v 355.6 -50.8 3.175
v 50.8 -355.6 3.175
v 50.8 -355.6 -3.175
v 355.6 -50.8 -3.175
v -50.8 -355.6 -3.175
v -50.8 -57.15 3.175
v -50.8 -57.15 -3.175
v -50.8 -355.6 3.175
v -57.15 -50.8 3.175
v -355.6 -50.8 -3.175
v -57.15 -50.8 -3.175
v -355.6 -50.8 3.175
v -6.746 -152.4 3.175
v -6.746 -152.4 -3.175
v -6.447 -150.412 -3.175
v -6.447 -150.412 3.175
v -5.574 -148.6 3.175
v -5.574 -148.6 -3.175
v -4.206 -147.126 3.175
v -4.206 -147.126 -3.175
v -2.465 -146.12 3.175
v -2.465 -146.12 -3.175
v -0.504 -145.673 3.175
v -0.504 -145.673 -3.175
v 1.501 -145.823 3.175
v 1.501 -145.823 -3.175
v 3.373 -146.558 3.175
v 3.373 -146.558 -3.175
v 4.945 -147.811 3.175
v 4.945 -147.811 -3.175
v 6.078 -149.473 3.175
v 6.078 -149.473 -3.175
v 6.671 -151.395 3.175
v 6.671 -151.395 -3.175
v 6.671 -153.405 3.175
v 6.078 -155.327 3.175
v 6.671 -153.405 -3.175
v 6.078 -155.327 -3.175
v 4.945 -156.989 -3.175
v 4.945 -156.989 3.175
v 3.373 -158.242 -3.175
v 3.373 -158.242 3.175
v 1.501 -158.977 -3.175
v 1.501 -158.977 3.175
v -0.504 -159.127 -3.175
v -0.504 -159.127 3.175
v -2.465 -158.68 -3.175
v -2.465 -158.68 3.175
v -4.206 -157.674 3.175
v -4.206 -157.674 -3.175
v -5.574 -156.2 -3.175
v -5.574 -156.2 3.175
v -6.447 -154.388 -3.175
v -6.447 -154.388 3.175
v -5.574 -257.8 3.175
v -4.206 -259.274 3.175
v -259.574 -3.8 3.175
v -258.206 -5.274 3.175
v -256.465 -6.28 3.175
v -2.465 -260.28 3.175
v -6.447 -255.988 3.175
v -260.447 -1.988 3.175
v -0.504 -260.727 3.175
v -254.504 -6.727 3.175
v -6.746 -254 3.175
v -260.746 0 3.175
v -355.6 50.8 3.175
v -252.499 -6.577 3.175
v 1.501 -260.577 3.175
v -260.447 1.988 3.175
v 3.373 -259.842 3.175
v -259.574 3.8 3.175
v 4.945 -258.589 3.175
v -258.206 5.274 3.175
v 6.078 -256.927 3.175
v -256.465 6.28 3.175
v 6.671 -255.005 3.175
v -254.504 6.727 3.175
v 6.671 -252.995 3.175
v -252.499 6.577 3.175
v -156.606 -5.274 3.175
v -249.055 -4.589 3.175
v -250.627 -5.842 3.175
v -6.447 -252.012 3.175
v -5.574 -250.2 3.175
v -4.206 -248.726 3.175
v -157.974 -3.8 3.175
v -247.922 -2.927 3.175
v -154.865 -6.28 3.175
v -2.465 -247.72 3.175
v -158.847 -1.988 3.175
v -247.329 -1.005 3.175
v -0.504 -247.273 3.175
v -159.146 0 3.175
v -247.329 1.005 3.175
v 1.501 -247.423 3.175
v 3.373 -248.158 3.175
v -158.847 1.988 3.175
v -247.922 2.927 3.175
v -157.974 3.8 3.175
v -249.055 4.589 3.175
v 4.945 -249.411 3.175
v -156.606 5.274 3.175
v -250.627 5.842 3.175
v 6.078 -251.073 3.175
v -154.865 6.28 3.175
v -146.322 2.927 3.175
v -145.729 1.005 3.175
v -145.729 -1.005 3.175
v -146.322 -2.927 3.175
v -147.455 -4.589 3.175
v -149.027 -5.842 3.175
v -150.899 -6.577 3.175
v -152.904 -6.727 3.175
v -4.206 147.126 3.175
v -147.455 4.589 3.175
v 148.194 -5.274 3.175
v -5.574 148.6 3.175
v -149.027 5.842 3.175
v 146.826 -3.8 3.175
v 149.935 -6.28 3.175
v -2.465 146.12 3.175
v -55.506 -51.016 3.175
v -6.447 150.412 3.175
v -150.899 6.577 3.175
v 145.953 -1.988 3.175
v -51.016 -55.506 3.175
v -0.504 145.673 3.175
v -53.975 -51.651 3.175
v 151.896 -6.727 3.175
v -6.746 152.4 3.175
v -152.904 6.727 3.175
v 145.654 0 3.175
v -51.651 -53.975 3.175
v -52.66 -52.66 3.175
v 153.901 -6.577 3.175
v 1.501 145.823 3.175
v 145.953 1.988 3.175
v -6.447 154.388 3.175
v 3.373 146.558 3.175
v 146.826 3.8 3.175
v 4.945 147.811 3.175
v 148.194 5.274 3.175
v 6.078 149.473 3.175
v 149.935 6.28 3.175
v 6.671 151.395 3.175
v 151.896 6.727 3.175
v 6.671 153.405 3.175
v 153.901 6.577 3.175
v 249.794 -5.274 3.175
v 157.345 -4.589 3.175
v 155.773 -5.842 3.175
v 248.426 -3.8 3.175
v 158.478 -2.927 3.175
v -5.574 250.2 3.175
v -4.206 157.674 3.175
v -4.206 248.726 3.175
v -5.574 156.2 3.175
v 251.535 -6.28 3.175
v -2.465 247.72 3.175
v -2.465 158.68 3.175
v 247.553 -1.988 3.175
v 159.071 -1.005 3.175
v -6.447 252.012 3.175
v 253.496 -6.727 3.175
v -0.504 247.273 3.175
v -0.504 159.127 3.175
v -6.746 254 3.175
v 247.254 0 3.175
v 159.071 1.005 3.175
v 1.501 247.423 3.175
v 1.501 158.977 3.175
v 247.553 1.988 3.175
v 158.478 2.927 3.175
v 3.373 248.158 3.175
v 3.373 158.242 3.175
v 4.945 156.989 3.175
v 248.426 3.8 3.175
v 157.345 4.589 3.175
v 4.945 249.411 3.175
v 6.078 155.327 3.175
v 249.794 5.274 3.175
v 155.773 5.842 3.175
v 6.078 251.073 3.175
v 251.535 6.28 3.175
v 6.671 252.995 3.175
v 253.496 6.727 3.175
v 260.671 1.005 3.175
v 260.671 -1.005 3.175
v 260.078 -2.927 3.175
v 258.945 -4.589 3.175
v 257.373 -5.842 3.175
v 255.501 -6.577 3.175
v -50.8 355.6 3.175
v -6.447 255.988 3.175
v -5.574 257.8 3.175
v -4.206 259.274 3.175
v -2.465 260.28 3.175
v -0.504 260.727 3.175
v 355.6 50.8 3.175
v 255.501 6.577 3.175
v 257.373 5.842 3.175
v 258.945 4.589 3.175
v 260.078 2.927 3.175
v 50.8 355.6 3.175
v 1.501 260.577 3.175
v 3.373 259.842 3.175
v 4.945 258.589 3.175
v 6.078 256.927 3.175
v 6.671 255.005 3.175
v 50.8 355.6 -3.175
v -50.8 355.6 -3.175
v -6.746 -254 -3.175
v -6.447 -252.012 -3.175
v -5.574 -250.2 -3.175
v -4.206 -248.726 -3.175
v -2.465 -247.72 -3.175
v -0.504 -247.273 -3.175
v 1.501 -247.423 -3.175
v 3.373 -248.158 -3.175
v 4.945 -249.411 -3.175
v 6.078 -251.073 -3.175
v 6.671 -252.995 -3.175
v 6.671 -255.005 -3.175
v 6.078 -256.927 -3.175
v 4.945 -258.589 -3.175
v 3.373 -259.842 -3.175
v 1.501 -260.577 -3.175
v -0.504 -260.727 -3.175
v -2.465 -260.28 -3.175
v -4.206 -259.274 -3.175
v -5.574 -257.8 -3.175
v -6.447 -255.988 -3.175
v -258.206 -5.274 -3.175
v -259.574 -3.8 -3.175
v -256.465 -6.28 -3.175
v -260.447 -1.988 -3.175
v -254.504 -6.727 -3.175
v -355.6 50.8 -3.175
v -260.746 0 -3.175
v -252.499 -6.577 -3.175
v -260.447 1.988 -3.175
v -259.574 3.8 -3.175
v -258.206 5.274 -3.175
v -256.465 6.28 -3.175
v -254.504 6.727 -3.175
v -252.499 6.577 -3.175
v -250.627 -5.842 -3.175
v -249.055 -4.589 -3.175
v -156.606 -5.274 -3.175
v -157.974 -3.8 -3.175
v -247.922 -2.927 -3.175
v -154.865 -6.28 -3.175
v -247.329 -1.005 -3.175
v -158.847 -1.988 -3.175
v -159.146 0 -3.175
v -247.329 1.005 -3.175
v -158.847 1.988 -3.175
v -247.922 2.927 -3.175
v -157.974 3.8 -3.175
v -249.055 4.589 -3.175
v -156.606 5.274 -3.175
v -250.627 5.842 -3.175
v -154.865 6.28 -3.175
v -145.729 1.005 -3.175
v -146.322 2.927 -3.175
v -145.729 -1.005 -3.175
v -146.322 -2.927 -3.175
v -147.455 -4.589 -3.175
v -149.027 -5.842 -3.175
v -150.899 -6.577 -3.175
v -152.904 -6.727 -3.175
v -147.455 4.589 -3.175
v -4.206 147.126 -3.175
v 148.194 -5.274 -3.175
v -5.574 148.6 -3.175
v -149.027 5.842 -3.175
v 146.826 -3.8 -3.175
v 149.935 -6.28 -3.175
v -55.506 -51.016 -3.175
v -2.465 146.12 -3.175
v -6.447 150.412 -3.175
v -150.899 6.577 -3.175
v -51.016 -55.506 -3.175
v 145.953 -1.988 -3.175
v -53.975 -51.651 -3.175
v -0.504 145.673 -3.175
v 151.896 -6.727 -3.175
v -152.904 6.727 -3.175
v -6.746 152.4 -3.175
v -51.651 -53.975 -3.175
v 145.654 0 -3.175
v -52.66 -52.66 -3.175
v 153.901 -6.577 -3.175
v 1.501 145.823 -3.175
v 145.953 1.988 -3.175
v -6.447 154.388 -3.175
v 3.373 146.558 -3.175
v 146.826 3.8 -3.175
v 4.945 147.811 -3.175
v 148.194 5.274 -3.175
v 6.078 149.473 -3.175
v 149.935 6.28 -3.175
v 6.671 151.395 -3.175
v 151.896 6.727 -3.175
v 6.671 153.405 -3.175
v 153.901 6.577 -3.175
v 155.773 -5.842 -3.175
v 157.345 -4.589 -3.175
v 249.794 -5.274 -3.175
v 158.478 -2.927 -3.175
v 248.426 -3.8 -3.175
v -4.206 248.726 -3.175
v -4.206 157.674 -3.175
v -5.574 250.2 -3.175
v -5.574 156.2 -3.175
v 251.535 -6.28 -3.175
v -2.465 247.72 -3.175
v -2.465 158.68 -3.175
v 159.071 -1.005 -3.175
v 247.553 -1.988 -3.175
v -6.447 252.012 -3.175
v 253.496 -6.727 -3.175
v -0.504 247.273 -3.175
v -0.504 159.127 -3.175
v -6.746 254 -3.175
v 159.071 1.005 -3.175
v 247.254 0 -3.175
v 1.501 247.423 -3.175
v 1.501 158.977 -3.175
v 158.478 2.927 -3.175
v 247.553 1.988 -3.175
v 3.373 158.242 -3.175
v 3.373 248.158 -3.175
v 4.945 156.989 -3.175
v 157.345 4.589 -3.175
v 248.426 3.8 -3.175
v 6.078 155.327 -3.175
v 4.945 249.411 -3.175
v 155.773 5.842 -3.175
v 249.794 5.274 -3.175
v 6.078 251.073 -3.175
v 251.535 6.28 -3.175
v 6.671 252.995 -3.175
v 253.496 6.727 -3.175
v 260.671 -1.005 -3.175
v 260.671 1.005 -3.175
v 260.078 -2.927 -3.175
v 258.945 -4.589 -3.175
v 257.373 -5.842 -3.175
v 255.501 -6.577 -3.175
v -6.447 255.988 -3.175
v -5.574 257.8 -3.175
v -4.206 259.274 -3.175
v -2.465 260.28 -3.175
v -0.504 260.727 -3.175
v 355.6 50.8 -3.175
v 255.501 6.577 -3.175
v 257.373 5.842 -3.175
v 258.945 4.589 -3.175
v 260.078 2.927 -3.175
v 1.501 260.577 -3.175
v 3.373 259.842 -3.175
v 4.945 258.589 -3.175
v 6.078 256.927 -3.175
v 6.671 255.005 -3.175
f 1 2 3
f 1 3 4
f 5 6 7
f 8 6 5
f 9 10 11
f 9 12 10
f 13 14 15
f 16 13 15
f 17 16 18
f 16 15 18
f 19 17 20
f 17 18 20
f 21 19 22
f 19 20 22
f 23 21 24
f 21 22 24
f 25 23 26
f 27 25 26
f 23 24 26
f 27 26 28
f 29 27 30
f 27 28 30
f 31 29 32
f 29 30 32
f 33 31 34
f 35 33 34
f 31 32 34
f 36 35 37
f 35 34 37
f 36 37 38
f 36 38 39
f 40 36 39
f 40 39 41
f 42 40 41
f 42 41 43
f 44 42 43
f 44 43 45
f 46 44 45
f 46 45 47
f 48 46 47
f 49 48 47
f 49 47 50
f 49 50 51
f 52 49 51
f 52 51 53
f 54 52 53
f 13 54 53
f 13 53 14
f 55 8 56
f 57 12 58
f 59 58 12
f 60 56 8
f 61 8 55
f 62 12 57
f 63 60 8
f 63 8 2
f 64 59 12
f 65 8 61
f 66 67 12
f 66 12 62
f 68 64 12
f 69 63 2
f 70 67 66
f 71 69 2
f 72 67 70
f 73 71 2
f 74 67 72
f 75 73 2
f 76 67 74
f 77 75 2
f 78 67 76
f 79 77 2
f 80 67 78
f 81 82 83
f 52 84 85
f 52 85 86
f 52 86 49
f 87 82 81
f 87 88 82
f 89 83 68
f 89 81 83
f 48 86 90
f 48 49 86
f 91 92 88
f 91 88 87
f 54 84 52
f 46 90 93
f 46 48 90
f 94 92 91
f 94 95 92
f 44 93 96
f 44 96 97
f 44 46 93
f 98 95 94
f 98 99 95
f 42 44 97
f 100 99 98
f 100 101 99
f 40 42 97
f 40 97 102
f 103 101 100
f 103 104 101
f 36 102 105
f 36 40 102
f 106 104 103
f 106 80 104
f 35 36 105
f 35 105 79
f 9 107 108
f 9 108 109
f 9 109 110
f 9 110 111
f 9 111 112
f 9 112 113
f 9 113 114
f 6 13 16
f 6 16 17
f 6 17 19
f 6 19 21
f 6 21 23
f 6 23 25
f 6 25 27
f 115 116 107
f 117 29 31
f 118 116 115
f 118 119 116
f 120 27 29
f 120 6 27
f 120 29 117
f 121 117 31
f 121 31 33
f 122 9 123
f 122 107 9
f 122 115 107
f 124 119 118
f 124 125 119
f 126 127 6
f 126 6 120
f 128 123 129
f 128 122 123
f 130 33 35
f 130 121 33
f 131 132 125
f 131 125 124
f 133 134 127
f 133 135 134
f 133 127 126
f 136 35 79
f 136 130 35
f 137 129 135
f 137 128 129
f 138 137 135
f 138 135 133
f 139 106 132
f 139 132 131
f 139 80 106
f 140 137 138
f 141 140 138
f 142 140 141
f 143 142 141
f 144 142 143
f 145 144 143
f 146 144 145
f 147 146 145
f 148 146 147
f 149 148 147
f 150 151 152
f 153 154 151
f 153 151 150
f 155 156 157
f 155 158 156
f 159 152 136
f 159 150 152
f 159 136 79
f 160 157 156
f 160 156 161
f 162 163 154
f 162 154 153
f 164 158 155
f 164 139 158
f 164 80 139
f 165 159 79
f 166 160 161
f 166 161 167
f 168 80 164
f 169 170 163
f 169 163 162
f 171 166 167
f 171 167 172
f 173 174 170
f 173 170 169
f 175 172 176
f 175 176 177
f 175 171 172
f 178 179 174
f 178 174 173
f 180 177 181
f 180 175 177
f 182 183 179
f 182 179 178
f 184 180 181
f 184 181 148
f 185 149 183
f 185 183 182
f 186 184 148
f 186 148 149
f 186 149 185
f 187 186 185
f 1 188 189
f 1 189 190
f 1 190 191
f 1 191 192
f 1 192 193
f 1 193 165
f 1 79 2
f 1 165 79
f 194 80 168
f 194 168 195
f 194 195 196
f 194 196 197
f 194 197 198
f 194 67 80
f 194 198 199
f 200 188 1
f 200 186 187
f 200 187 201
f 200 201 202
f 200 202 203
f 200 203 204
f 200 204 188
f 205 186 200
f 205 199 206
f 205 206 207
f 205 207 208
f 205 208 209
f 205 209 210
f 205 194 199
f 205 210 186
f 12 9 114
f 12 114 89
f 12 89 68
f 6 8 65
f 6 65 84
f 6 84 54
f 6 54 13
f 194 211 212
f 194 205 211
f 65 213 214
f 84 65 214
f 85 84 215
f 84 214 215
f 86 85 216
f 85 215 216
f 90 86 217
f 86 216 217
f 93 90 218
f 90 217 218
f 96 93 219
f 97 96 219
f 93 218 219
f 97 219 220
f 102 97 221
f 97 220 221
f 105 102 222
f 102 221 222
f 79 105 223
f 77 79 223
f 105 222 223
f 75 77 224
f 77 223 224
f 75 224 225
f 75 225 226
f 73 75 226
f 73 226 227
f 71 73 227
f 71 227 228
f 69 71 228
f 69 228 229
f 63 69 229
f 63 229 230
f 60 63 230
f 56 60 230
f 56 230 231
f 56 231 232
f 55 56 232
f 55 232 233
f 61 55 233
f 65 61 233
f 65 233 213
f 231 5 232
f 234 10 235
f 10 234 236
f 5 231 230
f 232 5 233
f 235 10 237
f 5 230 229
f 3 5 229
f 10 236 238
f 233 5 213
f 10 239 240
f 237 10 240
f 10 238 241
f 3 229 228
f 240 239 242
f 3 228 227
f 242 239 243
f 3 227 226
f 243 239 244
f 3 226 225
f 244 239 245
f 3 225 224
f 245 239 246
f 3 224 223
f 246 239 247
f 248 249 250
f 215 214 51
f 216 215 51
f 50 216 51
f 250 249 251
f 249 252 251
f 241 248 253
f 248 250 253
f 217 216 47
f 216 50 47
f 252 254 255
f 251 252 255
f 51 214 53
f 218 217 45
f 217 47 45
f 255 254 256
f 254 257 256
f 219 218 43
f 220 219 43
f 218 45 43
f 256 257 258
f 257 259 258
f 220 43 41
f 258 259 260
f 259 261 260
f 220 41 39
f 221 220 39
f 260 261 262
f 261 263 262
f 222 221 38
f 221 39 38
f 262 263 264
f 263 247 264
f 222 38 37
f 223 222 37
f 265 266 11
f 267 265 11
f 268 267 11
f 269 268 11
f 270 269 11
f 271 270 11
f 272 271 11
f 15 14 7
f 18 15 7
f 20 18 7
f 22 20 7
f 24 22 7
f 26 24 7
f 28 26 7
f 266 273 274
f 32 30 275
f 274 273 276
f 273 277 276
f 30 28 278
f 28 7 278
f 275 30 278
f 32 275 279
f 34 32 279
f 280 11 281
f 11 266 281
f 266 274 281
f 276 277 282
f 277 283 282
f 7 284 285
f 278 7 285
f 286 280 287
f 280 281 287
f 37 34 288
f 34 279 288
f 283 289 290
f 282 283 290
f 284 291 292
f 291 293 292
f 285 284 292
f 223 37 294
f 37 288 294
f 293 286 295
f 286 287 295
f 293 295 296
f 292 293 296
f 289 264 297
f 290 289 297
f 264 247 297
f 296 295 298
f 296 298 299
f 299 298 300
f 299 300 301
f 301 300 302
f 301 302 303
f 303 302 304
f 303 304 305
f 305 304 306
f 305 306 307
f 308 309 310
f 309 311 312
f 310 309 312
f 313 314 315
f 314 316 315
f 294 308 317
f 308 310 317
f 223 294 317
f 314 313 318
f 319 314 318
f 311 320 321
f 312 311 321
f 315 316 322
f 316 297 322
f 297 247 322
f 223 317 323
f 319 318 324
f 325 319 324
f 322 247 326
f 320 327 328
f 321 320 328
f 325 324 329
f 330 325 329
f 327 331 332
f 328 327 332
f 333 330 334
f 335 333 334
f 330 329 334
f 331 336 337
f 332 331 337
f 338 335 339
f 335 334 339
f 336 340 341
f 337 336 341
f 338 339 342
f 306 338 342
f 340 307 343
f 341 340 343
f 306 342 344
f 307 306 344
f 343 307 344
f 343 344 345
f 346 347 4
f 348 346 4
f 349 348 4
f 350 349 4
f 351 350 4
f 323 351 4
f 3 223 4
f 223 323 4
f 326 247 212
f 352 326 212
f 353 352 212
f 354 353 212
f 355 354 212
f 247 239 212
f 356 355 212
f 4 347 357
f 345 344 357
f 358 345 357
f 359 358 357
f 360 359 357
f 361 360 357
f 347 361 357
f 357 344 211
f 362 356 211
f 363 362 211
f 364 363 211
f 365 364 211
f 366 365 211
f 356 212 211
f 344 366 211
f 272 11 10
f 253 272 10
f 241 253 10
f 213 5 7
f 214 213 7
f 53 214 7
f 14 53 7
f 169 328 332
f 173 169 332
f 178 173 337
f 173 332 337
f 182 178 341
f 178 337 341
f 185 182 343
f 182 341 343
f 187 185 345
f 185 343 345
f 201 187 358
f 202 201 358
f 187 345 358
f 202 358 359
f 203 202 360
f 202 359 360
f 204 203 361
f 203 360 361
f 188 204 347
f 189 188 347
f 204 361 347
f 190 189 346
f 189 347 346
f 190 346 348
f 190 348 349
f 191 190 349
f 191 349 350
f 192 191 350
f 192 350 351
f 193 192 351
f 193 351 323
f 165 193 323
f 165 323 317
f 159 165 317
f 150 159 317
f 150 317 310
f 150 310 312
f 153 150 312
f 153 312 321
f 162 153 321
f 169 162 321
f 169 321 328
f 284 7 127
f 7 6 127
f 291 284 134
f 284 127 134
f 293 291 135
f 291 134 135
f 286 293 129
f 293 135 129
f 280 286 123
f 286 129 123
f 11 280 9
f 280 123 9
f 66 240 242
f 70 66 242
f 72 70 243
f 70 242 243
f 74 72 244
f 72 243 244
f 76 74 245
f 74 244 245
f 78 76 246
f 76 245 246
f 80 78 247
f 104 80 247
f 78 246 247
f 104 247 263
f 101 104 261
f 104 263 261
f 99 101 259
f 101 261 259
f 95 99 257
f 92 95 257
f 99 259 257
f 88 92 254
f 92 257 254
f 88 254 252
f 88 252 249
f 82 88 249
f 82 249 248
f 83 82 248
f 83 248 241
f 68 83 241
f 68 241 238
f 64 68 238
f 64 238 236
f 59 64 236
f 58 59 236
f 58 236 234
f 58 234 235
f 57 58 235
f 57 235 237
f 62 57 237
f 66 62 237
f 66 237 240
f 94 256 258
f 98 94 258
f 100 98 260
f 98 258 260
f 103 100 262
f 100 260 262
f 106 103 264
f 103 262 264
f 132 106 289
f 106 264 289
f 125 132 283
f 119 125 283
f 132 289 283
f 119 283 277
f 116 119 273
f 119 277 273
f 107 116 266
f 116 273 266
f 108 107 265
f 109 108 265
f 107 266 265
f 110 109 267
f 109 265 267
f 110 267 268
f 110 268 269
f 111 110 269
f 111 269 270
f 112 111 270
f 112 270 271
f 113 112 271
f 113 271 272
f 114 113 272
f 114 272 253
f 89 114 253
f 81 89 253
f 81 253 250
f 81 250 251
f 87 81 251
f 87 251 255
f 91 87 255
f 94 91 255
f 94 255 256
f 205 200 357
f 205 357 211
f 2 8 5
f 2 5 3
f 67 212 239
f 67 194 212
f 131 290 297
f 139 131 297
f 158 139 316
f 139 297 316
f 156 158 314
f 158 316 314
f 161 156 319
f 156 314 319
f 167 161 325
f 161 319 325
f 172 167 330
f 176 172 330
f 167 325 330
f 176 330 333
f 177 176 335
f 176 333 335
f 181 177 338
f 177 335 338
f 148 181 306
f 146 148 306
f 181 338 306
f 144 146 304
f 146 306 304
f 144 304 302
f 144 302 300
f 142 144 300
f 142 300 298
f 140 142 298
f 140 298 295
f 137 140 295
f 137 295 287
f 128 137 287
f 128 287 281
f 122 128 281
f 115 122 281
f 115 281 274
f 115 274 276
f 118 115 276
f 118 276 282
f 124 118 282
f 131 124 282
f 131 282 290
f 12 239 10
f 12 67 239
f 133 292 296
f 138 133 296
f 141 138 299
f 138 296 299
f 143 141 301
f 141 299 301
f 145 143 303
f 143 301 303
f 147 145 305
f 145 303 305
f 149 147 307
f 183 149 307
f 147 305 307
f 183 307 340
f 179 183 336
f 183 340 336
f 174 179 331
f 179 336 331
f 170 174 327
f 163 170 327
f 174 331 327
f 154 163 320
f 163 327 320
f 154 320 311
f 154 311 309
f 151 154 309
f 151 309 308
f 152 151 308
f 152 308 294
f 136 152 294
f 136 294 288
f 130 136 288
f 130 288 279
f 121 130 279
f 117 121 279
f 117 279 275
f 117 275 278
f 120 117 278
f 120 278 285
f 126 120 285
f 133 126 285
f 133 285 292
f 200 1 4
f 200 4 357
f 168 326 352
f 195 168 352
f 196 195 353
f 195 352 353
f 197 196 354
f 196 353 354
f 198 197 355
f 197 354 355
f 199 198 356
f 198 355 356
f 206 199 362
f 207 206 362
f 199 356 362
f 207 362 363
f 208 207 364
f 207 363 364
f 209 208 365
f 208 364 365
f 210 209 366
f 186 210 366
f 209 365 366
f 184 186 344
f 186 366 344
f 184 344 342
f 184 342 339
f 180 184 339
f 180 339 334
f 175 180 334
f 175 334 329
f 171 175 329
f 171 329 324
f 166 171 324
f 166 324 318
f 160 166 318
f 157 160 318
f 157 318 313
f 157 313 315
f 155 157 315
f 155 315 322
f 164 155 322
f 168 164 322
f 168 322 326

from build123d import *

# Parameters (mm, degrees)
F1_DEPTH = 3.175
F2_R     = 6.35
F5_D     = 13.49248


with BuildPart() as f1:
    # F0 (on Top) → F1 (new body, symmetric)
    with BuildSketch(Plane.XY):
        Polygon((-355.6, 50.8), (-355.6, -50.8), (-50.8, -50.8), (-50.8, -355.6), (50.8, -355.6), (355.6, -50.8), (355.6, 50.8), (50.8, 355.6), (-50.8, 355.6), align=None)
    extrude(amount=F1_DEPTH, both=True)

    # F2
    f2_edges = [f1.edges().sort_by_distance(p)[0] for p in [
        (-50.8, -50.8, 0),
    ]]
    fillet(f2_edges, radius=F2_R)

    # F5 (through all)
    with Locations(Plane.XY.offset(3.175)):
        with Locations((0, -254), (0, -152.4), (152.4, 0), (254, 0), (0, 152.4), (0, 254), (-152.4, 0), (-254, 0)):
            Hole(F5_D / 2)


solid = f1.part
